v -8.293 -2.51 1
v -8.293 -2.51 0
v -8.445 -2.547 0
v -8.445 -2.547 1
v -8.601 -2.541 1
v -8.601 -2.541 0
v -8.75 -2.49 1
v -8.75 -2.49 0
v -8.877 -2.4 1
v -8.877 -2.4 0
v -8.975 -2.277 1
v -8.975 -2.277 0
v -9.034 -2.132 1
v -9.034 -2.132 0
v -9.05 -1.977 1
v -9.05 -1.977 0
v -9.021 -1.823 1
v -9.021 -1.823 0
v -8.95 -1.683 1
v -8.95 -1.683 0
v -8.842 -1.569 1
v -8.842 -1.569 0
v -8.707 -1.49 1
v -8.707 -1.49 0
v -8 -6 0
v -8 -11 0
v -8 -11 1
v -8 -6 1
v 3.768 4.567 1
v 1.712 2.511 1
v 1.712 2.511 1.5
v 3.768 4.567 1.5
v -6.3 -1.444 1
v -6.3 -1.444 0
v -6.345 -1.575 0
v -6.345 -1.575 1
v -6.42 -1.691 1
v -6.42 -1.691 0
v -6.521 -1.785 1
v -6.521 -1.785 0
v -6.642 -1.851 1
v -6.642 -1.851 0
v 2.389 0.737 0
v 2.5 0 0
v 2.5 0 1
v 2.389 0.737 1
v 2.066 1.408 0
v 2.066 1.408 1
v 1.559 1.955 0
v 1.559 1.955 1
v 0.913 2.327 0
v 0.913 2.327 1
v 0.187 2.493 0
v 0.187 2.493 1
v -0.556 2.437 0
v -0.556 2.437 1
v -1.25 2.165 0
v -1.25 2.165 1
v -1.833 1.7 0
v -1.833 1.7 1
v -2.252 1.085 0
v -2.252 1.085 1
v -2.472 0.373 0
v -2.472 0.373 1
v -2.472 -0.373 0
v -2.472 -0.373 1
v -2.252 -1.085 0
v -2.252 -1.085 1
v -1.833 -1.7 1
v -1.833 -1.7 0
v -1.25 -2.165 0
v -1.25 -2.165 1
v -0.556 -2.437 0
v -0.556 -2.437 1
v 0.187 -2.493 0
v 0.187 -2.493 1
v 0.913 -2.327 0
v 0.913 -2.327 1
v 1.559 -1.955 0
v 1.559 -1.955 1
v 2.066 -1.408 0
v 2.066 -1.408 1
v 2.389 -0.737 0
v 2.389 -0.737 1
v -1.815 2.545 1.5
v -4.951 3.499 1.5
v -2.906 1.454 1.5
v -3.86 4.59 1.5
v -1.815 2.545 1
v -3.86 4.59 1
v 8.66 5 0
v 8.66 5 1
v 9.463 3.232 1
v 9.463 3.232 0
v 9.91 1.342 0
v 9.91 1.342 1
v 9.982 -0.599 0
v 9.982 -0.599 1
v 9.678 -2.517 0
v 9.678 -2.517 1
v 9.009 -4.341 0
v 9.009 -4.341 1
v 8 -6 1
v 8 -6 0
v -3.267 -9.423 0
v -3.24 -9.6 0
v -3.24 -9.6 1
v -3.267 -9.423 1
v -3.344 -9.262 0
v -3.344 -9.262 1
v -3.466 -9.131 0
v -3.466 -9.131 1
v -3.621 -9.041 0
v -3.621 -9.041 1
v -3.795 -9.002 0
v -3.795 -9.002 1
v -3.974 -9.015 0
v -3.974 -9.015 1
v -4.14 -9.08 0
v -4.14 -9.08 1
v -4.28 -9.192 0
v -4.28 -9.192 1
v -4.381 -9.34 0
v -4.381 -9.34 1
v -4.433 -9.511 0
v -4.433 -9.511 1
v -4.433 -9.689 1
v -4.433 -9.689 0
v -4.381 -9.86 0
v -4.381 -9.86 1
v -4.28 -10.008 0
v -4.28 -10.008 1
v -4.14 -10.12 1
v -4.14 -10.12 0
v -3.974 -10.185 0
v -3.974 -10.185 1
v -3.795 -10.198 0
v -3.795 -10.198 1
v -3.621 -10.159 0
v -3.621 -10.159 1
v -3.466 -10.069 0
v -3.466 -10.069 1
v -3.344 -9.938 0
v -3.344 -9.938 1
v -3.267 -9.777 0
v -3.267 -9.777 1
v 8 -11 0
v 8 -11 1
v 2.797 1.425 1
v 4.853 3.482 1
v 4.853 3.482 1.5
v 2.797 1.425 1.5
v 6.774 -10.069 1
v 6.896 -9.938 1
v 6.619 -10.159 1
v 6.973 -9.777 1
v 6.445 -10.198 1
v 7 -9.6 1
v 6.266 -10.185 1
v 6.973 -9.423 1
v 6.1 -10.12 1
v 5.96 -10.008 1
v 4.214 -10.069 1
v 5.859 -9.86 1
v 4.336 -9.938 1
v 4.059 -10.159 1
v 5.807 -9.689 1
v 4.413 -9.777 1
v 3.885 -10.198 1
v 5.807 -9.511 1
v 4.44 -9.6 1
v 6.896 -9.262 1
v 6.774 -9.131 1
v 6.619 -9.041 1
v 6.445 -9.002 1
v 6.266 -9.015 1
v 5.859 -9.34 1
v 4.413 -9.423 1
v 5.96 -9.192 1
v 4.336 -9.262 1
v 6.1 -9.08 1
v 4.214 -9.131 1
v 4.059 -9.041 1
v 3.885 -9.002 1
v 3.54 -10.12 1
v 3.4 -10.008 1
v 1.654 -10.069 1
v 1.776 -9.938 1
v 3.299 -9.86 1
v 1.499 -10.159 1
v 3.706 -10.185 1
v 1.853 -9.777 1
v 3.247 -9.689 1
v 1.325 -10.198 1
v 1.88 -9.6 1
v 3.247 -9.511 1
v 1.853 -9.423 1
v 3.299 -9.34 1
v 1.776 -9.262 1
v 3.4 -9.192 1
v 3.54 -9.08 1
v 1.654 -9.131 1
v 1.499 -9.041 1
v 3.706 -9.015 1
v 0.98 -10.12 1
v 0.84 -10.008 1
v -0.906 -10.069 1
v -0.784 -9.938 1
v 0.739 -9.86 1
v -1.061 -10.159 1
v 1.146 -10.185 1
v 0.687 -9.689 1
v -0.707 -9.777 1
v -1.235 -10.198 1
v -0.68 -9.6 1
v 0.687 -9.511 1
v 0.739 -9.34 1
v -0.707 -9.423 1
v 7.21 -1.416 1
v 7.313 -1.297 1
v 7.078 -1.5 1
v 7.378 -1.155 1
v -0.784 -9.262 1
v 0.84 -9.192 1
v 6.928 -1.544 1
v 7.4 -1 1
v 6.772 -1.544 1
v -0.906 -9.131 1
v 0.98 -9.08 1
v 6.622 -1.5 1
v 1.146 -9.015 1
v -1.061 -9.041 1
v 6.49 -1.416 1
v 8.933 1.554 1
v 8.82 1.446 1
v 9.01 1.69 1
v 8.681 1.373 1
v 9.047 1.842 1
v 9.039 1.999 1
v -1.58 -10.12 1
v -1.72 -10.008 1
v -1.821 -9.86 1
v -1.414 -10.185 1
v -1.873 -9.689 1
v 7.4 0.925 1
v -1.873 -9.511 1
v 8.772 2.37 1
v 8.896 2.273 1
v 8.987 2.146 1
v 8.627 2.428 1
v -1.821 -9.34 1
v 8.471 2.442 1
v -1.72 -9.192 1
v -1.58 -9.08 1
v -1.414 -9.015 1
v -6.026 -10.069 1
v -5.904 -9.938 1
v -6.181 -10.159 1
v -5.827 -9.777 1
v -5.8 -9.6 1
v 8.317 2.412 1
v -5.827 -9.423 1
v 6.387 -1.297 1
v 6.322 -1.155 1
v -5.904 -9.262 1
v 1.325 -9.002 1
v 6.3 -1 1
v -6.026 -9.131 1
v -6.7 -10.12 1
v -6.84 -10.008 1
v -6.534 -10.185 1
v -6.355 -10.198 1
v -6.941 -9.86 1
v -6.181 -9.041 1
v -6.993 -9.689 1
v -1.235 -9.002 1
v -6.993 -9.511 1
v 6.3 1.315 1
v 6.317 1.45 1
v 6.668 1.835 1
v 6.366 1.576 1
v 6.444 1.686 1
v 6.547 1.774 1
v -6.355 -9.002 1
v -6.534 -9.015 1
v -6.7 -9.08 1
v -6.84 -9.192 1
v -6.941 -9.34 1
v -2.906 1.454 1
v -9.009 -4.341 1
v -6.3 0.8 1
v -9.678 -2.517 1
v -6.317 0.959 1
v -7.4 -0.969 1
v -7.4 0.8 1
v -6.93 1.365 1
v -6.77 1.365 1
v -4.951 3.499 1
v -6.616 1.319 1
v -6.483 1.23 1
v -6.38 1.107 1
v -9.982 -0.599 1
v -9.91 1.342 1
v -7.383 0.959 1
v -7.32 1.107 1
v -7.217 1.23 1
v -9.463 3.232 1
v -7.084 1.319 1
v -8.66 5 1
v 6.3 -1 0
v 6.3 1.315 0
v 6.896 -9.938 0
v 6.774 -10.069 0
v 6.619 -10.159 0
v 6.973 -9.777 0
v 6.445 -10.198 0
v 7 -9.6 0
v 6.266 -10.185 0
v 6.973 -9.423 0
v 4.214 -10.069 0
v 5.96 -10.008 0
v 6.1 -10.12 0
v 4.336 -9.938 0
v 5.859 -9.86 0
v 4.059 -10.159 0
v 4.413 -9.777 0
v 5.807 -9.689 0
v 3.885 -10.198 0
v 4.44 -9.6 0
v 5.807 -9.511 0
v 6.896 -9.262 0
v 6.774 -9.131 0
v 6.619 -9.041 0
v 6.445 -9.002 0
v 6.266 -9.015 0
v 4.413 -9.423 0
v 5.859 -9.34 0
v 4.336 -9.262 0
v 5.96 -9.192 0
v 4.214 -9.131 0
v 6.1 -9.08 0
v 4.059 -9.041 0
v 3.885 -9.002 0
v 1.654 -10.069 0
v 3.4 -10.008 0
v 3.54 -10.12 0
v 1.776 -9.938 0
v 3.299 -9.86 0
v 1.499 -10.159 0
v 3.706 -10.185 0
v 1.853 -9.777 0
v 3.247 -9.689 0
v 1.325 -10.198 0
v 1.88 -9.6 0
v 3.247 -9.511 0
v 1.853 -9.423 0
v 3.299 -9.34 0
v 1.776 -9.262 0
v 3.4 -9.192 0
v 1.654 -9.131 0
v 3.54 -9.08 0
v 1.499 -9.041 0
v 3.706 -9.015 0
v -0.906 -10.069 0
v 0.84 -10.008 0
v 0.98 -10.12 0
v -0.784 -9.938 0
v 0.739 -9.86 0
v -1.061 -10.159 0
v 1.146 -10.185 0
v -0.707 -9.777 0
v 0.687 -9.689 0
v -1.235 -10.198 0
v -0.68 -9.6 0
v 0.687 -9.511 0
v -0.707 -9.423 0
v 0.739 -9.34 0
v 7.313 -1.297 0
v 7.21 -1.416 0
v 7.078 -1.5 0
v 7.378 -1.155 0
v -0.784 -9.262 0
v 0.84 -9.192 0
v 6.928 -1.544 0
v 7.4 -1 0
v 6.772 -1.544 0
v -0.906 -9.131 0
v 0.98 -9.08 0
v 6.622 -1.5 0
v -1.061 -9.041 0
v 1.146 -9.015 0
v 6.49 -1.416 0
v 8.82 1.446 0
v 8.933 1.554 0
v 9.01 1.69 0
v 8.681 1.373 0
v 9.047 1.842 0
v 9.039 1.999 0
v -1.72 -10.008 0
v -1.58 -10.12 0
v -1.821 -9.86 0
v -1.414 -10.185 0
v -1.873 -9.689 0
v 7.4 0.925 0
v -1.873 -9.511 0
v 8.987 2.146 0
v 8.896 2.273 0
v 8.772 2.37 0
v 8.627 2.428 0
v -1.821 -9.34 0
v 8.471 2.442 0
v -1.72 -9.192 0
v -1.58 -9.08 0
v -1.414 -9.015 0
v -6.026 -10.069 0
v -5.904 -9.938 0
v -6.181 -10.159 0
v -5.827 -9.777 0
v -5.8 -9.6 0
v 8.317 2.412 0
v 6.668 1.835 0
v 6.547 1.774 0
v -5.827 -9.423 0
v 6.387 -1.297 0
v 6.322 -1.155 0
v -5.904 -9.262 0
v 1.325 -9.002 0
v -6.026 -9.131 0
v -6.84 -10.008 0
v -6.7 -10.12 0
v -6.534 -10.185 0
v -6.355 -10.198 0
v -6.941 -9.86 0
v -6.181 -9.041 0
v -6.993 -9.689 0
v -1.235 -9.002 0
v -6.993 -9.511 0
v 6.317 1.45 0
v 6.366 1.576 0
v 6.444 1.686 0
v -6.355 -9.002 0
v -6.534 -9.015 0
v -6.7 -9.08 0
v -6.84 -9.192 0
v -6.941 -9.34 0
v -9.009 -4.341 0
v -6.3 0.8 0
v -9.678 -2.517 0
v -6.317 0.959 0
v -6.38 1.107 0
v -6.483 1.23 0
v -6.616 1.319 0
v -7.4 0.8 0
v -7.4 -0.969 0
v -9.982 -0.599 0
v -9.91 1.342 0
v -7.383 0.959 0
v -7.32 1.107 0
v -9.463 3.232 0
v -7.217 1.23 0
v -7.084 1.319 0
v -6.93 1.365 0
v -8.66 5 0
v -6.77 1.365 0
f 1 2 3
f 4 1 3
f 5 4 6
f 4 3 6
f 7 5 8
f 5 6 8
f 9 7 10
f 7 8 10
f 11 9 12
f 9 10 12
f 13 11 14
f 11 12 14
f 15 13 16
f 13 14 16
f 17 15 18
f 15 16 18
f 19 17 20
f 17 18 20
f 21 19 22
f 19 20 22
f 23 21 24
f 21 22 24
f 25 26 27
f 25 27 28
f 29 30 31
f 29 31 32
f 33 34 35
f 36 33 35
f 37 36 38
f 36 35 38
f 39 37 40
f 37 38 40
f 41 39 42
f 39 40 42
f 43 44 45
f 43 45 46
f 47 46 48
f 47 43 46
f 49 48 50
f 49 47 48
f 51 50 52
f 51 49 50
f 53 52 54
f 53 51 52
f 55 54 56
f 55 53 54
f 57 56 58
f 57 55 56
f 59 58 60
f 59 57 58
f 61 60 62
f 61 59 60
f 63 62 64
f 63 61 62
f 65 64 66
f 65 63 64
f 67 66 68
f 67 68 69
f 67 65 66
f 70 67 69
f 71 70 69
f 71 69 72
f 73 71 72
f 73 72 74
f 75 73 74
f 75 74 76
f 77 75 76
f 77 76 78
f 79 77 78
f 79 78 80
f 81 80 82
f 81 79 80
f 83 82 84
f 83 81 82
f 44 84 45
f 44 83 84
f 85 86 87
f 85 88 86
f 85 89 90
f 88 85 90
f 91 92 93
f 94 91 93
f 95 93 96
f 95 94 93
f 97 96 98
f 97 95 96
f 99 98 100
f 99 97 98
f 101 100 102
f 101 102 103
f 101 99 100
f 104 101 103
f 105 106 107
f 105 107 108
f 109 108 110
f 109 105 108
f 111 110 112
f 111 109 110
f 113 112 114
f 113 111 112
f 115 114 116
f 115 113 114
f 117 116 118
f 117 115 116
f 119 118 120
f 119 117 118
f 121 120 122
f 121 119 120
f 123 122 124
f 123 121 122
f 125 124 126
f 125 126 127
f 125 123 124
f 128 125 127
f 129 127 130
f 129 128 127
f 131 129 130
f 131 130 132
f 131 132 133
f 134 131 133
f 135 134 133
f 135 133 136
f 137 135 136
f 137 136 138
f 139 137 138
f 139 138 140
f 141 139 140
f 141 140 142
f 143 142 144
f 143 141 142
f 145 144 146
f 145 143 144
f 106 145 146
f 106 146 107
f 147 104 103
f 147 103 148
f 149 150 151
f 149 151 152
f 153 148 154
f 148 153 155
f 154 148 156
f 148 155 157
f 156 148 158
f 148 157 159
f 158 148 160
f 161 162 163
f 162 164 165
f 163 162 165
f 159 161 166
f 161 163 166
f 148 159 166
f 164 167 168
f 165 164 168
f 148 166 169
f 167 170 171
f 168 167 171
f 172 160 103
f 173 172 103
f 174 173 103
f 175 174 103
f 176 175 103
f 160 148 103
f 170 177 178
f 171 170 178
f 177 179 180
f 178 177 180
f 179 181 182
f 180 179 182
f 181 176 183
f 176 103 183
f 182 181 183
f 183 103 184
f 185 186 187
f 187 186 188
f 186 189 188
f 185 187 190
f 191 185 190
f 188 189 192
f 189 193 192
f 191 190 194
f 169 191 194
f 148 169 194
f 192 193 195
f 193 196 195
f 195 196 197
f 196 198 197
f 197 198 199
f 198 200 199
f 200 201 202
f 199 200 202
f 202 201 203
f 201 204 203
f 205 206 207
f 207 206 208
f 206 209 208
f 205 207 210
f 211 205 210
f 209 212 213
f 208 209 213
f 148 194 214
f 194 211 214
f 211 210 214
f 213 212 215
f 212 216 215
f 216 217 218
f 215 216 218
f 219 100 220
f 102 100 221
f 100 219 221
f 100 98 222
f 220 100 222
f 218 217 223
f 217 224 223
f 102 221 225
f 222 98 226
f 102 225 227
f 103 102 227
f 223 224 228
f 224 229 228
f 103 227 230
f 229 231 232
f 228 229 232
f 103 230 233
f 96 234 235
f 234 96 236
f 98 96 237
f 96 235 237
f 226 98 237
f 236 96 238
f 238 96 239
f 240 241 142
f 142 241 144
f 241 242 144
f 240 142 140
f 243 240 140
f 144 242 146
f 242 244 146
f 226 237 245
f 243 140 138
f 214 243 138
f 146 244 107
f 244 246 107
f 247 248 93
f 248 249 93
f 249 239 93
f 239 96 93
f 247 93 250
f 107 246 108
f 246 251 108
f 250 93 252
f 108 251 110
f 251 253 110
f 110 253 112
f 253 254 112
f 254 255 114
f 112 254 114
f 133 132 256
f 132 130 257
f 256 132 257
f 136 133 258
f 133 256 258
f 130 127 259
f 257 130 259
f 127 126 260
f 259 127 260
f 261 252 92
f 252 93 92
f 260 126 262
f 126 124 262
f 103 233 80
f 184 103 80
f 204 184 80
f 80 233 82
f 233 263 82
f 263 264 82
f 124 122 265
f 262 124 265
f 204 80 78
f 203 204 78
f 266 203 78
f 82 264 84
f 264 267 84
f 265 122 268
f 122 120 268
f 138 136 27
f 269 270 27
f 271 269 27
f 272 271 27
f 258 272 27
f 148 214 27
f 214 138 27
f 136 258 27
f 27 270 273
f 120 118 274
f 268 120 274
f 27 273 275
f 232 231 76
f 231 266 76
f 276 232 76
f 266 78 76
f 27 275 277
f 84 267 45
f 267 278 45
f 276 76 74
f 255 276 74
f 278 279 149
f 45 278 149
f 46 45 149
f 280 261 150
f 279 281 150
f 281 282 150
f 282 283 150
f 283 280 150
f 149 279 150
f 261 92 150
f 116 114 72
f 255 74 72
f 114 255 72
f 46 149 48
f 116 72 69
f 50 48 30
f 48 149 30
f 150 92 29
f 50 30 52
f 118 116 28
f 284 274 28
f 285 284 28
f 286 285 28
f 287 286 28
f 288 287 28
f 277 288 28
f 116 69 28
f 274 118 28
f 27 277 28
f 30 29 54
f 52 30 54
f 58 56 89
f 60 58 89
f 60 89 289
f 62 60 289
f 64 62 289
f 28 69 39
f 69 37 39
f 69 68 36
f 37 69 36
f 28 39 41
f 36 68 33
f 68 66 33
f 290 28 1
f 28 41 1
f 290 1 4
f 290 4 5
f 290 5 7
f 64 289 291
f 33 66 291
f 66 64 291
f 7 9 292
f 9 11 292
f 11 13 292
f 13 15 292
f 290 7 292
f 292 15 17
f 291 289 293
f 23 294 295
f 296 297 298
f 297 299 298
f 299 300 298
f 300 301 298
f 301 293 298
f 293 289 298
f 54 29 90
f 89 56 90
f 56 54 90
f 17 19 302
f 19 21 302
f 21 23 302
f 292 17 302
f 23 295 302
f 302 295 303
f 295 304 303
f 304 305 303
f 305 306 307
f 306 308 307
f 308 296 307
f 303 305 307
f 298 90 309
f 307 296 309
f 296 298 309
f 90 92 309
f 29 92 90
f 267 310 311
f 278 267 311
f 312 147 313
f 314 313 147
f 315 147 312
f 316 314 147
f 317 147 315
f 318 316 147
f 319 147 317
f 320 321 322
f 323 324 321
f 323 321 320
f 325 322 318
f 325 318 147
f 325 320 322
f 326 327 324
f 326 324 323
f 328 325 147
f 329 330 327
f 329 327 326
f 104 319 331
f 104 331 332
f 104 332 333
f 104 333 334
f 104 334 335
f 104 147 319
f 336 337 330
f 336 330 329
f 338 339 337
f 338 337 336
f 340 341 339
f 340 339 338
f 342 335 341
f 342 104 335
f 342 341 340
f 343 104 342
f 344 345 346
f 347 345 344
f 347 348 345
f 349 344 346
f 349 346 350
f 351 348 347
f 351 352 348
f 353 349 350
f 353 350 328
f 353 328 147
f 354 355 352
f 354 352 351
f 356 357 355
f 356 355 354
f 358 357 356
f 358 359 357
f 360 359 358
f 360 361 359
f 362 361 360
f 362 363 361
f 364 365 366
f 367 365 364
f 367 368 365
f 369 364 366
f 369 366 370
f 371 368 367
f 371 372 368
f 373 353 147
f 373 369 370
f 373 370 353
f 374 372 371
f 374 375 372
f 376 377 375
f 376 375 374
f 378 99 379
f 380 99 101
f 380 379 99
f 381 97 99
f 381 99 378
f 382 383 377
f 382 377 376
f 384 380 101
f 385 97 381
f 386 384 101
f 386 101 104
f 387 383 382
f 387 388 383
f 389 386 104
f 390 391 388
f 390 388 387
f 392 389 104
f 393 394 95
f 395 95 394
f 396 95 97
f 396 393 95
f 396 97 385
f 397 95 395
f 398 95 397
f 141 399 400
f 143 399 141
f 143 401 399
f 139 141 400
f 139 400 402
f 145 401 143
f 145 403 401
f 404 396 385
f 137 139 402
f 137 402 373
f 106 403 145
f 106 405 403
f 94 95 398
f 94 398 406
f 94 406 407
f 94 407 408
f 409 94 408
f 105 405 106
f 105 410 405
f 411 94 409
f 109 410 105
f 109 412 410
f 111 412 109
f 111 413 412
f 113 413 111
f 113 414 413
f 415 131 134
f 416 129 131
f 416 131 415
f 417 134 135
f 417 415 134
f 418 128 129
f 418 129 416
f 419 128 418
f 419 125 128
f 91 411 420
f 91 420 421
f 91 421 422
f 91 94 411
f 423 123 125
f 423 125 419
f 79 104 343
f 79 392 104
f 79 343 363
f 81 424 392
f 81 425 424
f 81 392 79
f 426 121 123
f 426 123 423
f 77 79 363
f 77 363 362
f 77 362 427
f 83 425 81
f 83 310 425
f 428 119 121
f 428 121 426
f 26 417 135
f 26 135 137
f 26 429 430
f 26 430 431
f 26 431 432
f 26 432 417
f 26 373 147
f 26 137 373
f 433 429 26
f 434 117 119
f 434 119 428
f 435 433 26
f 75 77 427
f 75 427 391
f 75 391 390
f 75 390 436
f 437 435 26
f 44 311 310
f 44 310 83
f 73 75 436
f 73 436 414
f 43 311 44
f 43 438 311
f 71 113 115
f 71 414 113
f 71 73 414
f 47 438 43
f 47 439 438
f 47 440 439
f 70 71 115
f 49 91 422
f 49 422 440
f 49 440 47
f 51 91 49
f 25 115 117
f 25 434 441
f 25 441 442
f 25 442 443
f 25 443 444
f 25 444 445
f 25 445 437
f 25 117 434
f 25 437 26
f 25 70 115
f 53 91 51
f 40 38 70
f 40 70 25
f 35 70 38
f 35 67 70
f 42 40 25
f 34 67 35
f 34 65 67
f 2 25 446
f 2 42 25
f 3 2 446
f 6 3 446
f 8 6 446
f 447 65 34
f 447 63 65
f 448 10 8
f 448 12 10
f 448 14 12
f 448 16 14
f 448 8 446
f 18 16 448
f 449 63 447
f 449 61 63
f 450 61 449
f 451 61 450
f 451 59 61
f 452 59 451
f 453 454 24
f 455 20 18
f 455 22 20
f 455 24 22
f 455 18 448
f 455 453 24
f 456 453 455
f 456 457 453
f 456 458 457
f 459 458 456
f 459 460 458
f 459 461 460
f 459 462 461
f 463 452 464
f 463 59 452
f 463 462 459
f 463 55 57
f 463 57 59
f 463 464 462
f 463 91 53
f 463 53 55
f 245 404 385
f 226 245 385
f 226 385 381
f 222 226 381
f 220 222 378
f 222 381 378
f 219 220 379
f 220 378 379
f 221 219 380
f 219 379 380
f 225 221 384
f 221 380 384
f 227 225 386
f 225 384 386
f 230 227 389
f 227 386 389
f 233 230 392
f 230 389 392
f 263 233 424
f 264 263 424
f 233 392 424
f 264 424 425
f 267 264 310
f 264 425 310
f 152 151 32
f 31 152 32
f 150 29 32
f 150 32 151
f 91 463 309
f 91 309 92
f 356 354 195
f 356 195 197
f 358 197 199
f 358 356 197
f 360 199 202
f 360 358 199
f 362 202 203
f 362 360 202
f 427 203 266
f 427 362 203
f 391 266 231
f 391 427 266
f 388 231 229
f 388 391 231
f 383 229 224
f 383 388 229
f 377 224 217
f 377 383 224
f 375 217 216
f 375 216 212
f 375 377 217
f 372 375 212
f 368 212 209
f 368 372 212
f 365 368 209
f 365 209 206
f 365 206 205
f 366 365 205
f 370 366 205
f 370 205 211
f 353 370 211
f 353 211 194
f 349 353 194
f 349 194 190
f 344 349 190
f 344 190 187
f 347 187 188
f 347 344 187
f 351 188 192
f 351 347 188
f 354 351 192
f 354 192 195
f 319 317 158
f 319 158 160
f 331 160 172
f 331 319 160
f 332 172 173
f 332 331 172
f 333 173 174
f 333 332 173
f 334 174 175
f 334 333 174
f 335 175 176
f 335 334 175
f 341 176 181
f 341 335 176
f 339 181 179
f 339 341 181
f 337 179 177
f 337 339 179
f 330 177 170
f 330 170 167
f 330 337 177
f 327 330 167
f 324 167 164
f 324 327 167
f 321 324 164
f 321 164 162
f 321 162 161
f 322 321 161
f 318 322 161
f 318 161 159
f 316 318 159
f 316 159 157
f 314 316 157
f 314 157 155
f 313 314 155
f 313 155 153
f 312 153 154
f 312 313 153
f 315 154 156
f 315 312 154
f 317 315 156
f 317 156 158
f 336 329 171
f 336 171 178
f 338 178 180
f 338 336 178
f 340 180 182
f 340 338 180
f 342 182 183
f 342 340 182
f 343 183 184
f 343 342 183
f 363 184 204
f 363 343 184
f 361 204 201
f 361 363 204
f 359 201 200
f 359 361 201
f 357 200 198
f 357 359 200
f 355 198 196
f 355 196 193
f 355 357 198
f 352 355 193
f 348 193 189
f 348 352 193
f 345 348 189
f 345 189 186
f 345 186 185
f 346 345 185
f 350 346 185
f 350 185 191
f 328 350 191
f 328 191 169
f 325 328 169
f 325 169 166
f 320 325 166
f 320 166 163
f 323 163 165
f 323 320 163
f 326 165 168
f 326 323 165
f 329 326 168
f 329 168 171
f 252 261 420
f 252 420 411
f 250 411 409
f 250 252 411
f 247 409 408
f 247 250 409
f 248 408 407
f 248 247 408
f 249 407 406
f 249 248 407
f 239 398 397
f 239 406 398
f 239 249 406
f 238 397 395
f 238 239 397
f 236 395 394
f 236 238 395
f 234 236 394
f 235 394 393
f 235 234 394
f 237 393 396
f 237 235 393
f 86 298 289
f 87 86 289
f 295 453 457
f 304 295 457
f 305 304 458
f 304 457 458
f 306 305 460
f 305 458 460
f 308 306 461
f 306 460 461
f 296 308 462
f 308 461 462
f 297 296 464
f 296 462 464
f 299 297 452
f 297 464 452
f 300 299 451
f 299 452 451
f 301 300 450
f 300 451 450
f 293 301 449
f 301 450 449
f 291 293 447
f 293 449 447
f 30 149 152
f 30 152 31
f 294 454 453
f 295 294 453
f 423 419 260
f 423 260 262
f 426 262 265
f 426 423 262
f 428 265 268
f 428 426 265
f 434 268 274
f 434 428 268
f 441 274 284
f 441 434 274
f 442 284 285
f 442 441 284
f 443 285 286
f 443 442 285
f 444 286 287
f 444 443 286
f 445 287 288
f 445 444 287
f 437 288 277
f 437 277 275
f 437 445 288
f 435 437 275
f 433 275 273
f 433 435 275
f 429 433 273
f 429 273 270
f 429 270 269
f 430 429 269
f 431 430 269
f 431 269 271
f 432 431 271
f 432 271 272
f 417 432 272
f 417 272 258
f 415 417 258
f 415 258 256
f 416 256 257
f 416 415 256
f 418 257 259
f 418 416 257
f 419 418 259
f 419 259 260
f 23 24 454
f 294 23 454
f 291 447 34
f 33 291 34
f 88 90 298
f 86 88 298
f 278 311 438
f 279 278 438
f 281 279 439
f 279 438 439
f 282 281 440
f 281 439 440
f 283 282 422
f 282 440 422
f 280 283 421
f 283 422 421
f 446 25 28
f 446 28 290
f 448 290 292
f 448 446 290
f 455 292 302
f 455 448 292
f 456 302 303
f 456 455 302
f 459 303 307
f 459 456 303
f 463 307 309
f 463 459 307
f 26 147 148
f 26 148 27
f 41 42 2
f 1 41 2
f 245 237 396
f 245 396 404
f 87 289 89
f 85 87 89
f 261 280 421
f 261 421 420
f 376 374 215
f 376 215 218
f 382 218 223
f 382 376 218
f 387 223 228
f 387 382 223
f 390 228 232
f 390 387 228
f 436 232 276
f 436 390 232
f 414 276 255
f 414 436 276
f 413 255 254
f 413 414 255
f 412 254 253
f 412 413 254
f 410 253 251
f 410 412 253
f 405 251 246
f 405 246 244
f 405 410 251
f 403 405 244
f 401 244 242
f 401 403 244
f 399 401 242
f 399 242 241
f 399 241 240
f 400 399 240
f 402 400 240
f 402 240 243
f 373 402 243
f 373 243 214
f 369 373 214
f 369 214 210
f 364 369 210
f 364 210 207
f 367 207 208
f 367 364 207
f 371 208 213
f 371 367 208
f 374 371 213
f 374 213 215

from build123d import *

# Parameters (mm, degrees)
ESQUISSE1_R                = 2.5
ESQUISSE1_R_2              = 0.6
BOSS_EXTRU_1_DEPTH         = 1
ENL_V_MAT_EXTRU_1_DEPTH    = 15.899664426
BOSS_EXTRU_2_DEPTH         = 0.5
BOSS_EXTRU_3_DEPTH         = 0.5
CORTAR_EXTRUIR1_DEPTH      = 15.899664426
CORTAR_EXTRUIR1_DEPTH_BACK = 15.899664426


with BuildPart() as part:
    # Esquisse1 → Boss.-Extru.1 (new body)
    with BuildSketch(Plane.XY):
        with BuildLine():
            Line((-8.351646544, 5.5), (8.351646544, 5.5))
            ThreePointArc((8.351646544, 5.5), (9.995328218, -0.30563675), (8, -6))
            Line((8, -6), (8, -11))
            Line((8, -11), (-8, -11))
            Line((-8, -11), (-8, -6))
            ThreePointArc((-8, -6), (-9.995328218, -0.30563675), (-8.351646544, 5.5))
        make_face()
        Circle(ESQUISSE1_R, mode=Mode.SUBTRACT)
        with Locations((-6.4, -9.6)):
            Circle(ESQUISSE1_R_2, mode=Mode.SUBTRACT)
        with Locations((-3.84, -9.6)):
            Circle(ESQUISSE1_R_2, mode=Mode.SUBTRACT)
        with Locations((-1.28, -9.6)):
            Circle(ESQUISSE1_R_2, mode=Mode.SUBTRACT)
        with Locations((1.28, -9.6)):
            Circle(ESQUISSE1_R_2, mode=Mode.SUBTRACT)
        with Locations((3.84, -9.6)):
            Circle(ESQUISSE1_R_2, mode=Mode.SUBTRACT)
        with Locations((6.4, -9.6)):
            Circle(ESQUISSE1_R_2, mode=Mode.SUBTRACT)
        with BuildLine():
            Line((-6.3, 0.8), (-6.3, -1.444183839))
            ThreePointArc((-6.3, -1.444183839), (-6.419746949, -1.690835185), (-6.641967863, -1.851440553))
            Line((-6.641967863, -1.851440553), (-8.292953638, -2.509553847))
            ThreePointArc((-8.292953638, -2.509553847), (-9.009553847, -2.207046362), (-8.707046362, -1.490446153))
            Line((-8.707046362, -1.490446153), (-7.4, -0.969433434))
            Line((-7.4, -0.969433434), (-7.4, 0.8))
            ThreePointArc((-7.4, 0.8), (-6.85, 1.370822155), (-6.3, 0.8))
        make_face(mode=Mode.SUBTRACT)
        with BuildLine():
            Line((7.4, 1.315402872), (7.4, -1))
            ThreePointArc((7.4, -1), (6.85, -1.55), (6.3, -1))
            Line((6.3, -1), (6.3, 1.315402872))
            ThreePointArc((6.3, 1.315402872), (6.85, 1.865402872), (7.4, 1.315402872))
        make_face(mode=Mode.SUBTRACT)
    extrude(amount=BOSS_EXTRU_1_DEPTH)

    # Esquisse2 → Enlèv. mat.-Extru.1 (cut, through all)
    with BuildSketch(Plane.XY.offset(1)):
        with BuildLine():
            Line((6.668307266, 1.834524968), (8.317330789, 2.411683201))
            ThreePointArc((8.317330789, 2.411683201), (9.018145619, 2.074253838), (8.680716257, 1.373439009))
            Line((8.680716257, 1.373439009), (7.031692734, 0.796280776))
            ThreePointArc((7.031692734, 0.796280776), (6.330877904, 1.133710138), (6.668307266, 1.834524968))
        make_face()
    extrude(amount=-ENL_V_MAT_EXTRU_1_DEPTH, mode=Mode.SUBTRACT)

    # Esquisse3 → Boss.-Extru.2 (add)
    with BuildSketch(Plane.XY.offset(1)):
        Polygon((-4.950824849, 3.498836933), (-2.906168647, 1.454180731), (-1.81491955, 2.545429827), (-3.859575753, 4.59008603), align=None)
    extrude(amount=BOSS_EXTRU_2_DEPTH)

    # Esquisse4 → Boss.-Extru.3 (add)
    with BuildSketch(Plane.XY.offset(1)):
        Polygon((1.711538057, 2.510969329), (3.767681092, 4.567112364), (4.853186772, 3.481606684), (2.797043737, 1.425463649), align=None)
    extrude(amount=BOSS_EXTRU_3_DEPTH)

    # Croquis1 → Cortar-Extruir1 (cut, two sides: drawn at the far end of the back side and taken through both)
    with BuildSketch(Plane.XY.offset(1).offset(-CORTAR_EXTRUIR1_DEPTH_BACK)):
        Polygon((-8.660254038, 5), (8.660254038, 5), (9.520326515, 6.024620039), (-9.576517097, 6.287420639), align=None)
    extrude(amount=CORTAR_EXTRUIR1_DEPTH + CORTAR_EXTRUIR1_DEPTH_BACK, mode=Mode.SUBTRACT)


solid = part.part
